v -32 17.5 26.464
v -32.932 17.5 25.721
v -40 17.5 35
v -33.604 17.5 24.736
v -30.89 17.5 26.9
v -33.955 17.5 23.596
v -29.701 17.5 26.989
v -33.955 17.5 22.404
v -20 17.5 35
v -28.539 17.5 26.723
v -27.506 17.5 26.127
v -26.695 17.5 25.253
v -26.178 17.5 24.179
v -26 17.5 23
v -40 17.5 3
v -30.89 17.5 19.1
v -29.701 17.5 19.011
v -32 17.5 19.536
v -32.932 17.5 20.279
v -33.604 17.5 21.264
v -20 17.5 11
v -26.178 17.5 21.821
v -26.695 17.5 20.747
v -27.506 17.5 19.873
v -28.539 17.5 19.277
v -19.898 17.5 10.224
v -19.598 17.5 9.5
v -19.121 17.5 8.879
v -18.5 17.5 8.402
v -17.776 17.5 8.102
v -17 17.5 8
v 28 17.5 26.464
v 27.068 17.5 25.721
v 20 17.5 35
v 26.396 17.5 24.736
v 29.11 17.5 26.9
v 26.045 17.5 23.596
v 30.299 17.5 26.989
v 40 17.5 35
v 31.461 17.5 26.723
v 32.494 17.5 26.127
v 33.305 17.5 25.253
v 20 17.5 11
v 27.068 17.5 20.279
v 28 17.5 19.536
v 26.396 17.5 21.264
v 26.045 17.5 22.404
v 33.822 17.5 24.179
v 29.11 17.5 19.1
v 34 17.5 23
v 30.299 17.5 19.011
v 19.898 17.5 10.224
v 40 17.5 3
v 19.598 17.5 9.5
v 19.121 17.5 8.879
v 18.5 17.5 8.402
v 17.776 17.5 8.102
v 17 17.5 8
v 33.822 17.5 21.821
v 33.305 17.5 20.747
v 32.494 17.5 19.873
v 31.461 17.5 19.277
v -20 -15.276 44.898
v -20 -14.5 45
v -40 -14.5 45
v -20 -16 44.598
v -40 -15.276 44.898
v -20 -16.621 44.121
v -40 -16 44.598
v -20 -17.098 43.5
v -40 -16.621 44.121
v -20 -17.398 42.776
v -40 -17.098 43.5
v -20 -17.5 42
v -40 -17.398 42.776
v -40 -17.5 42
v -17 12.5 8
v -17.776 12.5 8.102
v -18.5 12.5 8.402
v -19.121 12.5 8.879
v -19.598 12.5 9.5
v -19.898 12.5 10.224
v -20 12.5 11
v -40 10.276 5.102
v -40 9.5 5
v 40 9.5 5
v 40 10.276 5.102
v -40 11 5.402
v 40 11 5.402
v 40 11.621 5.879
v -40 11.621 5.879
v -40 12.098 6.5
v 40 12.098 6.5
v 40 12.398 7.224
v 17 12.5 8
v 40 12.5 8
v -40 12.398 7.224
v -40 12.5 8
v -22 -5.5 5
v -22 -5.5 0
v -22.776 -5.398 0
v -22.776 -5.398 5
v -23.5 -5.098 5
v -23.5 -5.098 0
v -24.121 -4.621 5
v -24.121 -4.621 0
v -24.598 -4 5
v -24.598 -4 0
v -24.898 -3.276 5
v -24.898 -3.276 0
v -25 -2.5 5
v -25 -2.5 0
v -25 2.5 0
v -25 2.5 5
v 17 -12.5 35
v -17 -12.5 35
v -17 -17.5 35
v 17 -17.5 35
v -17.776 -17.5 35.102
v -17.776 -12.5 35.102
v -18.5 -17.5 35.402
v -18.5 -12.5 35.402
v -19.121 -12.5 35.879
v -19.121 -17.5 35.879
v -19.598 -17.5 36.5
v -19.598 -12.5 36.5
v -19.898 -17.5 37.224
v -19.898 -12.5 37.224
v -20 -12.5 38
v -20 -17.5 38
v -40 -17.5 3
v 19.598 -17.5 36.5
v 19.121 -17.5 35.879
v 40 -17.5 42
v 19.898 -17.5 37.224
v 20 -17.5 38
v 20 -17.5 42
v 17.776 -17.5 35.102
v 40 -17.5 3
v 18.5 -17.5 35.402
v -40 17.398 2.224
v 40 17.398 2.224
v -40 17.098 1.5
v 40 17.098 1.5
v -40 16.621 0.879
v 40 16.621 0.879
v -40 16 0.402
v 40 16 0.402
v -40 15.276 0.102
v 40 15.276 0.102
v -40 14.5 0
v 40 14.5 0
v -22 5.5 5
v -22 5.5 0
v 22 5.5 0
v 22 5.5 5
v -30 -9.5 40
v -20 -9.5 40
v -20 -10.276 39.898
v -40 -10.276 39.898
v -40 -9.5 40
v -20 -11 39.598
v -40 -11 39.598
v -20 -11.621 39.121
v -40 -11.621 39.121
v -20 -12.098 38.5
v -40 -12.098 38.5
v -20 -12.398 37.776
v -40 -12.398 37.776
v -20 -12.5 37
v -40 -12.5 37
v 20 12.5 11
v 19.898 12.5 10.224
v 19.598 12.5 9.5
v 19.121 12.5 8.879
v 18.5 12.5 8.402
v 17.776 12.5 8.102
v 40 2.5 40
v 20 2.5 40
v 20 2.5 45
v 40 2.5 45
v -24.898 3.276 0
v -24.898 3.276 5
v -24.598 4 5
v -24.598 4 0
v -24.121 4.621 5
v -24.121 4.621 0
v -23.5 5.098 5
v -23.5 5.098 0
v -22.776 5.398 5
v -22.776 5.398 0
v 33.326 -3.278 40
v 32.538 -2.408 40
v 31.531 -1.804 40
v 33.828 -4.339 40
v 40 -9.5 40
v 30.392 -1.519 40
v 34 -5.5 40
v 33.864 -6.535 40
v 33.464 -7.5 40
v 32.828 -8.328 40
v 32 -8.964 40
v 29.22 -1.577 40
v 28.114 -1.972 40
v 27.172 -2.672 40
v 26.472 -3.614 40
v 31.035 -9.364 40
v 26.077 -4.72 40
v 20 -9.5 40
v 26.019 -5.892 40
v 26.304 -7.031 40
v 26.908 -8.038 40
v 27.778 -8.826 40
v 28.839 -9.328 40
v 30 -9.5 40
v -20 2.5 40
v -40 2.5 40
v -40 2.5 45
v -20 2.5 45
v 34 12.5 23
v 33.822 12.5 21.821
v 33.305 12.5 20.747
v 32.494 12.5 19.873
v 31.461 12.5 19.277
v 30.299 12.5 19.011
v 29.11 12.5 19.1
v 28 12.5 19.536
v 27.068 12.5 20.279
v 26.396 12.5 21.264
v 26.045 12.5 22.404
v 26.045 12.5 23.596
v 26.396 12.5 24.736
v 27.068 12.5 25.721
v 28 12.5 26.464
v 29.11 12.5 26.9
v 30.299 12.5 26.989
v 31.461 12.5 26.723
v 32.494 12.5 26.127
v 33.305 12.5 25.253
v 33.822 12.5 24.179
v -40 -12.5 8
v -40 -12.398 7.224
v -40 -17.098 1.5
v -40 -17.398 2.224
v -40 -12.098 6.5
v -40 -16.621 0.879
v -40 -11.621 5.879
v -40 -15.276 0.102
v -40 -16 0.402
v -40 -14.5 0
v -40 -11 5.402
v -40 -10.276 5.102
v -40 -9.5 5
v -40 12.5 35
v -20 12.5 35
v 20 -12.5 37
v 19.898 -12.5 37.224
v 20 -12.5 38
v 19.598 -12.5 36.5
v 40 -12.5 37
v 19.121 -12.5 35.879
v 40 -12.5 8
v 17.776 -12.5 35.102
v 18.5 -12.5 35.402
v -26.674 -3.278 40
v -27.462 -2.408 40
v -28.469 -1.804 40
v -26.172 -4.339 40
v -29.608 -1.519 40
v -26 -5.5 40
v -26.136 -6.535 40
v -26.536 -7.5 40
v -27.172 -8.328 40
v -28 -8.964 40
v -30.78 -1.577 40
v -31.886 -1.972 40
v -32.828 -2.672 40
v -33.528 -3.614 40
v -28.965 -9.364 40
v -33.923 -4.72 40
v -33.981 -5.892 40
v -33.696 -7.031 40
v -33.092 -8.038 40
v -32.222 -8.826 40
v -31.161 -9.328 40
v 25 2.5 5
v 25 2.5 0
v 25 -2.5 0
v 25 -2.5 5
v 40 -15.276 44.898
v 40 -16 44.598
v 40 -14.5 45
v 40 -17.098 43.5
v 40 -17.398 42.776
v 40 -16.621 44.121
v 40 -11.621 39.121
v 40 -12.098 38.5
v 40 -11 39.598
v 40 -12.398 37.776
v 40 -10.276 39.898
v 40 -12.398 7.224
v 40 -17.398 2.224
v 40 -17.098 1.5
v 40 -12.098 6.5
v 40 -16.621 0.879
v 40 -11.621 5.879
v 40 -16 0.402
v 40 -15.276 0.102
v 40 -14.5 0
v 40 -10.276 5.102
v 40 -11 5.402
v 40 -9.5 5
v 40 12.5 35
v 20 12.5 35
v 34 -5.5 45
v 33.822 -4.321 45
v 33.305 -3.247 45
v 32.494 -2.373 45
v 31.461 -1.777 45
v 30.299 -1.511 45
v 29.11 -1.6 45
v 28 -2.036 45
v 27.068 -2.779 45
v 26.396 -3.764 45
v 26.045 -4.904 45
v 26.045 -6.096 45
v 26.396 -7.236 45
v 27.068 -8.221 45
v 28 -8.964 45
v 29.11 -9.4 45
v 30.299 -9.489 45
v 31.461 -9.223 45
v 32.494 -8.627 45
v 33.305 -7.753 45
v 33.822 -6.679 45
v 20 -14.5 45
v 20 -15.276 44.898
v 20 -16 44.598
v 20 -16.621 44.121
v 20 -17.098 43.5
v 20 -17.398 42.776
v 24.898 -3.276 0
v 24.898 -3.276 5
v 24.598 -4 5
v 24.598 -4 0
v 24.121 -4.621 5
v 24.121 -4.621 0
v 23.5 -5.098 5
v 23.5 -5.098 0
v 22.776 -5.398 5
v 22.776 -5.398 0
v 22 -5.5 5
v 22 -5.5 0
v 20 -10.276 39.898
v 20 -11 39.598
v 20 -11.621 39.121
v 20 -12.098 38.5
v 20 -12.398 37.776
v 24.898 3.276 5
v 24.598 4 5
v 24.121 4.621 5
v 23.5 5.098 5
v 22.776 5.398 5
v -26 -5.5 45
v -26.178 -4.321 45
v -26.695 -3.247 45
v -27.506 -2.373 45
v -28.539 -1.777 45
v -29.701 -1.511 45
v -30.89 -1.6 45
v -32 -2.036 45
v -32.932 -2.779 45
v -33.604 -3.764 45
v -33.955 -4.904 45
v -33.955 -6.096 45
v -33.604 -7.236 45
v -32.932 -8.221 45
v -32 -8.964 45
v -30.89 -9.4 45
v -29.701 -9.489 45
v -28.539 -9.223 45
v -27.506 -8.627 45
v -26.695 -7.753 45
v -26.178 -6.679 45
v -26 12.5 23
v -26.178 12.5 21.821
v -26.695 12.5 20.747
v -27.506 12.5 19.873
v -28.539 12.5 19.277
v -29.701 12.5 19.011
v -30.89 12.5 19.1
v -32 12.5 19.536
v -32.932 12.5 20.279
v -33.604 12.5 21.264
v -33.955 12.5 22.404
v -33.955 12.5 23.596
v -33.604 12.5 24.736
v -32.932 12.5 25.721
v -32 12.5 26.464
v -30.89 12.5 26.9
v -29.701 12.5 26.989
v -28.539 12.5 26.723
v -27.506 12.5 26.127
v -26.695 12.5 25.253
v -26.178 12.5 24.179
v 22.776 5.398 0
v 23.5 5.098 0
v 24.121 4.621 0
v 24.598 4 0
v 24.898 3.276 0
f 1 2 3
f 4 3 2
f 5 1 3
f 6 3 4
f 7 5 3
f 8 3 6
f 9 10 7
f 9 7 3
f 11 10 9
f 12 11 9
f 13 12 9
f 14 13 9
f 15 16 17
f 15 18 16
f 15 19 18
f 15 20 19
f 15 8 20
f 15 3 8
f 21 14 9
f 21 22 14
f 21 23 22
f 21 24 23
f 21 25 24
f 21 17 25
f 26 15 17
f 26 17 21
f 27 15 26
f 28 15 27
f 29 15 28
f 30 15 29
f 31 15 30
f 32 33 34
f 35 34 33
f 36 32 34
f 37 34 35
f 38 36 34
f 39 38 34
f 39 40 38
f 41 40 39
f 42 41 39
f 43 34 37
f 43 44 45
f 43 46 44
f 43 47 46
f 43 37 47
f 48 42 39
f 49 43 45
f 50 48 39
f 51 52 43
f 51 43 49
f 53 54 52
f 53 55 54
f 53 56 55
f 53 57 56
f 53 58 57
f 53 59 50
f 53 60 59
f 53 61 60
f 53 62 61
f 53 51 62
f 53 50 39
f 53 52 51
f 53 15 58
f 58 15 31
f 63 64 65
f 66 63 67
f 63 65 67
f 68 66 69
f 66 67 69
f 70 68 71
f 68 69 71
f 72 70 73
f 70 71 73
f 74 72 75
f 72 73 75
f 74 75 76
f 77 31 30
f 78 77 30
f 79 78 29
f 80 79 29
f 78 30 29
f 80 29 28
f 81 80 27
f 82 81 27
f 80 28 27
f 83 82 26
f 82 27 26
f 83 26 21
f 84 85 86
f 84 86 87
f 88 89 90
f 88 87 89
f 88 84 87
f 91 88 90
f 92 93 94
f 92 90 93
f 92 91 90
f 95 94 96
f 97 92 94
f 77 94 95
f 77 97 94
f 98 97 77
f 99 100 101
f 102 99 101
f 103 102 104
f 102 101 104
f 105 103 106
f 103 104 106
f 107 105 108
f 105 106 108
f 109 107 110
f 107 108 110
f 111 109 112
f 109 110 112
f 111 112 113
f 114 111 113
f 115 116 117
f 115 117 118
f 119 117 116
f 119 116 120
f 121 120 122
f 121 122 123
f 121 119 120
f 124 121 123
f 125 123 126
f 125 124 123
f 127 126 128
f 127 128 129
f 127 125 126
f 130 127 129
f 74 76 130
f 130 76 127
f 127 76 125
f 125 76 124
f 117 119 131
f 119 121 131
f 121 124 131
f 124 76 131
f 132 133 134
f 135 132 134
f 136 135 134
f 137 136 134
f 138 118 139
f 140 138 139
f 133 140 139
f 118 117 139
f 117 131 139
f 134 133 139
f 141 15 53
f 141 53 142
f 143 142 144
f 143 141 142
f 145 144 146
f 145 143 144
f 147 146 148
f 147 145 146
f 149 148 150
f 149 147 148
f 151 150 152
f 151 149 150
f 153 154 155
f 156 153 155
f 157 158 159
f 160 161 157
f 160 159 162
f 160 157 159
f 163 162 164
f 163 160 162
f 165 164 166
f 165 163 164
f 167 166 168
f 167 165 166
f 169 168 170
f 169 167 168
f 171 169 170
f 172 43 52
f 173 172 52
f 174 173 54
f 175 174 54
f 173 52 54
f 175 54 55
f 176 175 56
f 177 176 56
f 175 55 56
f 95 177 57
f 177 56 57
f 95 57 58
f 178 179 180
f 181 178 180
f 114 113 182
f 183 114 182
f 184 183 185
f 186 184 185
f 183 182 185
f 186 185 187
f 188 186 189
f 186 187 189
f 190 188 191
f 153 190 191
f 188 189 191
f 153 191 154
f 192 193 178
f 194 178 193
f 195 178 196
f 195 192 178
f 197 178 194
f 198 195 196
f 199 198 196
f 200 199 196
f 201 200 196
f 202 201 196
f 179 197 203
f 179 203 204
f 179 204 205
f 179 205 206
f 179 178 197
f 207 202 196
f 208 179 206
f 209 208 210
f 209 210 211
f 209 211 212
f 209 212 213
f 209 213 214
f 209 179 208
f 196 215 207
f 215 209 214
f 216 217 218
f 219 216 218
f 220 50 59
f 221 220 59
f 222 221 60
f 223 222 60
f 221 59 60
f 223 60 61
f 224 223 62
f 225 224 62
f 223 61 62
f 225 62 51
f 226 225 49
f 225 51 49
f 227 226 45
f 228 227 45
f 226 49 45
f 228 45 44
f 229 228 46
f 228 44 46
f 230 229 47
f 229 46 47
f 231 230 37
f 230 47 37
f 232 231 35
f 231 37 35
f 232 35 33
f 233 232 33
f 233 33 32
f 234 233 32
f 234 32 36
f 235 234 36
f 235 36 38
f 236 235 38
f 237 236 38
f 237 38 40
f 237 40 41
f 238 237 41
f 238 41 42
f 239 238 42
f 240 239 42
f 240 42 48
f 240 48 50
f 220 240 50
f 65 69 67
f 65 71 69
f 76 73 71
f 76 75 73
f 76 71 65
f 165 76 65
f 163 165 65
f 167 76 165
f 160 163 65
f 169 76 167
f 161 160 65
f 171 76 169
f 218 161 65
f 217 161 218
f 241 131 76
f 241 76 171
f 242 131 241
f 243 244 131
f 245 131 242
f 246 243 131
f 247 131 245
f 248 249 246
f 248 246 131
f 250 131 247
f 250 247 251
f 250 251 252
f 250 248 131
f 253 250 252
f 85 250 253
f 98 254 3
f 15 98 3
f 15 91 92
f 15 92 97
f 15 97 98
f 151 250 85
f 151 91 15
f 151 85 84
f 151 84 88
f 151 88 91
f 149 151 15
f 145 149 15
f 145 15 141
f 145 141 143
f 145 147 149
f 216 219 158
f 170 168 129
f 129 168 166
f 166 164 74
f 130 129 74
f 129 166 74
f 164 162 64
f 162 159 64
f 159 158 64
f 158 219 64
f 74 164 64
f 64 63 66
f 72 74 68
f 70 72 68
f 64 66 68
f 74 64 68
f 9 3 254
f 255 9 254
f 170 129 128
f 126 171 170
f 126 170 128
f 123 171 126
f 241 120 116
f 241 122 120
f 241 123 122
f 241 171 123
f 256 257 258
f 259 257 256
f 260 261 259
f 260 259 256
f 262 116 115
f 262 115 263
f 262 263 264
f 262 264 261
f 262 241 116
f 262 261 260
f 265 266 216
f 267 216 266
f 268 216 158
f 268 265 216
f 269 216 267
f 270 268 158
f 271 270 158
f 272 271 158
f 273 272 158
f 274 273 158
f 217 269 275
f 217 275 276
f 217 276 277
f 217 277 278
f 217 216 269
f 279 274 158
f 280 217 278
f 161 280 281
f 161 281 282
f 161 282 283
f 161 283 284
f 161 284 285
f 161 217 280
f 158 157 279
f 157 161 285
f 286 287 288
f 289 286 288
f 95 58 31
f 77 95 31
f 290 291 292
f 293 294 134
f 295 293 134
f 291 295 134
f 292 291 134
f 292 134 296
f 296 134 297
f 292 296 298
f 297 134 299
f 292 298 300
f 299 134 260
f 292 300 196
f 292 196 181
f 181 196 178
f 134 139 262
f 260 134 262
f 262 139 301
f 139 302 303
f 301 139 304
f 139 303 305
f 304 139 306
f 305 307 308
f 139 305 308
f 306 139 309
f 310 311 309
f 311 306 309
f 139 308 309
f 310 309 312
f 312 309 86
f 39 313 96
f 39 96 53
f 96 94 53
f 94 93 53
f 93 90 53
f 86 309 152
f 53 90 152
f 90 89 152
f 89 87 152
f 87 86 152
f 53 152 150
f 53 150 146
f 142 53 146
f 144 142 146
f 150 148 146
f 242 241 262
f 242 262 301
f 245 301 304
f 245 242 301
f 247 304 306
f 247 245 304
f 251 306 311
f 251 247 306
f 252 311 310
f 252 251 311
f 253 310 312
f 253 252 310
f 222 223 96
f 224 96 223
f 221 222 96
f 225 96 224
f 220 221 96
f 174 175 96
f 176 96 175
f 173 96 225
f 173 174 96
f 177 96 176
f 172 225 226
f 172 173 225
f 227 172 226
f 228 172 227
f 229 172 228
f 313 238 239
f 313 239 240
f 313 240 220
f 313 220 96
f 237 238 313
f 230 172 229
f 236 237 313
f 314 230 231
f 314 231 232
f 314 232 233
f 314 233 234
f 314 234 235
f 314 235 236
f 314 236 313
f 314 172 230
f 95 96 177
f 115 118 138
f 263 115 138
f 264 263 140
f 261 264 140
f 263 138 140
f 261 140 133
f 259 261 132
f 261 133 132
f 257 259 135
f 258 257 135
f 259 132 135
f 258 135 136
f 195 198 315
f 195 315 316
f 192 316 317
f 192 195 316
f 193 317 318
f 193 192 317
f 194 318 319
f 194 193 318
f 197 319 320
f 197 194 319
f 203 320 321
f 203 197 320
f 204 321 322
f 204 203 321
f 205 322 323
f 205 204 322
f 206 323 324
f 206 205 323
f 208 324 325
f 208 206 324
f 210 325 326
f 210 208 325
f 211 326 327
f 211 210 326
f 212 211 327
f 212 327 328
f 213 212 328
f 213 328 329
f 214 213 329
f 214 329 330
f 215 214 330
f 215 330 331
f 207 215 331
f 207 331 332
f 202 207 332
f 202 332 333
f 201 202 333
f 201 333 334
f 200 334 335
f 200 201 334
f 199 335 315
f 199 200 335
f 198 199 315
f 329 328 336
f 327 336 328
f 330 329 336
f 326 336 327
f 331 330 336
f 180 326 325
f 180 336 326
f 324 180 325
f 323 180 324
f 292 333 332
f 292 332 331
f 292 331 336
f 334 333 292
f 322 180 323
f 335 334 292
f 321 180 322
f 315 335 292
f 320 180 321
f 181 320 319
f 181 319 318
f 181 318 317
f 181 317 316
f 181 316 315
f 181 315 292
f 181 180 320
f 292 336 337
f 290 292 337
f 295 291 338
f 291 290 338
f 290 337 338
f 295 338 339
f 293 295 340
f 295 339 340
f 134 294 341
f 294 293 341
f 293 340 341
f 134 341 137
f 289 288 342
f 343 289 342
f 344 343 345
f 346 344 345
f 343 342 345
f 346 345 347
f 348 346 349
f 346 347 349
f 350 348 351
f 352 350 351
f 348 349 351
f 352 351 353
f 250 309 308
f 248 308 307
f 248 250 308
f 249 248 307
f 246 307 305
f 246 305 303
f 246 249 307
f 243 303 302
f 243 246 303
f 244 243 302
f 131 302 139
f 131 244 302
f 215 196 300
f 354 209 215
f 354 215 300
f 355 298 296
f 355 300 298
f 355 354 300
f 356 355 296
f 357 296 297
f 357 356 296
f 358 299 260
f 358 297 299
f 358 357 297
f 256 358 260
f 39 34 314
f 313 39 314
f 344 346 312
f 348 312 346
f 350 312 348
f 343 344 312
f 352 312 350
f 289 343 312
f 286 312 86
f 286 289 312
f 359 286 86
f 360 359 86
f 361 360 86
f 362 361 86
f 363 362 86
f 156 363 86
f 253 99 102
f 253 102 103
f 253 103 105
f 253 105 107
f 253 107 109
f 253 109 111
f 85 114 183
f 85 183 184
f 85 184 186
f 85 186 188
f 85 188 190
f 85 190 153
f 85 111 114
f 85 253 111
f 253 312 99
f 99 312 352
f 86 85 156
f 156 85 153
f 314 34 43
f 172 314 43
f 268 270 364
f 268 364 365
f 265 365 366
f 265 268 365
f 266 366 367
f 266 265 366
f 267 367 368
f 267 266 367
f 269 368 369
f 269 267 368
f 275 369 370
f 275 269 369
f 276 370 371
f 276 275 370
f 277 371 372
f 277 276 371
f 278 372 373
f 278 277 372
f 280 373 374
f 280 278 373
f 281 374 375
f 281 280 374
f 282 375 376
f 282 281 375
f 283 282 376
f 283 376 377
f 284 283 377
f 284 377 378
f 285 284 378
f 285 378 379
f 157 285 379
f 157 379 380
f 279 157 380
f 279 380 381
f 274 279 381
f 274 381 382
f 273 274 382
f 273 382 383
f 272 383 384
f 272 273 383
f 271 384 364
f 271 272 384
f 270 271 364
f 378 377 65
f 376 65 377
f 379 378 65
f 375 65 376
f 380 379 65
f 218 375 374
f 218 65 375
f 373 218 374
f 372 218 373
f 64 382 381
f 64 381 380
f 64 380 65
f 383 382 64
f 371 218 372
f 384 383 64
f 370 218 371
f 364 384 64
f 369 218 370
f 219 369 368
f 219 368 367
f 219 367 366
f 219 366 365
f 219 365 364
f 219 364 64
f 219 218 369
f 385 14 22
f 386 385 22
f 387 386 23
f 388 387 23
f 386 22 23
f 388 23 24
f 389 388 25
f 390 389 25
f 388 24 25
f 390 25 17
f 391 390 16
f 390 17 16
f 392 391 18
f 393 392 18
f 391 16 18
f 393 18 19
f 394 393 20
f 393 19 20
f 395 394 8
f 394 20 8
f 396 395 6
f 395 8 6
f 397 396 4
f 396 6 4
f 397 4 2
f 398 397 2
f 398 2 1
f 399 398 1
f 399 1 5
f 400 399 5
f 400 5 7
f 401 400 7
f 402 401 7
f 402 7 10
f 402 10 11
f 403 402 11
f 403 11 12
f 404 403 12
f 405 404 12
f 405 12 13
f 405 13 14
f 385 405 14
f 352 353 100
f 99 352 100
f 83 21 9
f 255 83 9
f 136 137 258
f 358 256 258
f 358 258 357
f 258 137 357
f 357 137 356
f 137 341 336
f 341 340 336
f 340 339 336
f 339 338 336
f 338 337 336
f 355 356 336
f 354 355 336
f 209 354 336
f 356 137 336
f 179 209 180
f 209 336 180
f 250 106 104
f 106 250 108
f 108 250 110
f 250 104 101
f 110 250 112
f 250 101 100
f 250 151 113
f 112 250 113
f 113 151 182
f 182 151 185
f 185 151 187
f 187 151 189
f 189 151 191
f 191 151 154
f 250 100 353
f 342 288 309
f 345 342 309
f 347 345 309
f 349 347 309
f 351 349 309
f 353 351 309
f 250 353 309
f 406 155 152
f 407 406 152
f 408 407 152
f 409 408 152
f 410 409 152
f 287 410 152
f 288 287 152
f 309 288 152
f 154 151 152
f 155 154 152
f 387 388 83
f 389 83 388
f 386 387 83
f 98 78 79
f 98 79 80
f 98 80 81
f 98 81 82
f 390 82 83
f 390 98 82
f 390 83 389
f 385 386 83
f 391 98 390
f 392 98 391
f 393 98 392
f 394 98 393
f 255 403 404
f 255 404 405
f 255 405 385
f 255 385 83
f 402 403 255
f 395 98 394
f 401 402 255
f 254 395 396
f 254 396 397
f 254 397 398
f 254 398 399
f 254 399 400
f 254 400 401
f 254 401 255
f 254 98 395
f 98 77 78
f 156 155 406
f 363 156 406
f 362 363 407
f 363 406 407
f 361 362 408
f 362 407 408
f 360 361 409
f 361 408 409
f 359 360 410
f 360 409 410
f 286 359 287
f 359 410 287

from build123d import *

# Parameters (mm, degrees)
SKETCH1_W                     = 80
SKETCH1_H                     = 35
RECTANGLE_BLOCK_EXTRUDE_DEPTH = 45
HOLLOW_OUT_BLOCK_CUT_DEPTH    = 81
OPEN_CORNER_CUT_DEPTH         = 81
TOP_CUTS_REACH                = 37
SKETCH15_R                    = 4
CIRCLE_CUT_ON_FRONT_REACH     = 12
SKETCH18_R                    = 4
RECTANGLE_CUT_ON_BACK_DEPTH   = 5
CUT_EXTRUDE17_DEPTH           = 81
SKETCH25_W                    = 40
SKETCH25_H                    = 3
SKETCH25_H_2                  = 17
CUT_EXTRUDE18_DEPTH           = 10
BOSS_EXTRUDE6_DEPTH           = 5


with BuildPart() as part:
    # Sketch1 → Rectangle Block Extrude (new body)
    with BuildSketch(Plane.XY):
        Rectangle(SKETCH1_W, SKETCH1_H)
    extrude(amount=RECTANGLE_BLOCK_EXTRUDE_DEPTH)

    # Sketch11 → Hollow Out Block Cut (cut, through all)
    with BuildSketch(Plane.ZY.offset(40)):
        with BuildLine():
            Line((8, 12.5), (37, 12.5))
            ThreePointArc((37, 12.5), (39.121320344, 11.621320344), (40, 9.5))
            Line((40, 9.5), (40, -9.5))
            ThreePointArc((40, -9.5), (39.121320344, -11.621320344), (37, -12.5))
            Line((37, -12.5), (8, -12.5))
            ThreePointArc((8, -12.5), (5.878679656, -11.621320344), (5, -9.5))
            Line((5, -9.5), (5, 9.5))
            ThreePointArc((5, 9.5), (5.878679656, 11.621320344), (8, 12.5))
        make_face()
    extrude(amount=-HOLLOW_OUT_BLOCK_CUT_DEPTH, mode=Mode.SUBTRACT)

    # Sketch12 → Open Corner Cut (cut, through all)
    with BuildSketch(Plane.ZY.offset(40)):
        with BuildLine():
            Line((35, 17.5), (35, 12.5))
            Line((35, 12.5), (37, 12.5))
            ThreePointArc((37, 12.5), (39.121320344, 11.621320344), (40, 9.5))
            Line((40, 9.5), (40, 2.5))
            Line((40, 2.5), (45, 2.5))
            Line((45, 2.5), (45, 17.5))
            Line((45, 17.5), (35, 17.5))
        make_face()
    extrude(amount=-OPEN_CORNER_CUT_DEPTH, mode=Mode.SUBTRACT)

    # Sketch15 → Top Cuts (cut, up to next)
    with BuildSketch(Plane(origin=(0, 17.5, 0), x_dir=(1, 0, 0), z_dir=(0, 1, 0)), mode=Mode.PRIVATE) as top_cuts_sk1:
        with BuildLine():
            Line((17, -8), (-17, -8))
            ThreePointArc((-17, -8), (-19.121320344, -8.878679656), (-20, -11))
            Line((-20, -11), (-20, -35))
            Line((-20, -35), (20, -35))
            Line((20, -35), (20, -11))
            ThreePointArc((20, -11), (19.121320344, -8.878679656), (17, -8))
        make_face()
    top_cuts_tool1 = extrude(top_cuts_sk1.sketch, amount=-TOP_CUTS_REACH, mode=Mode.PRIVATE) & part.part
    add(top_cuts_tool1.solids().sort_by_distance((0, 17.5, 21.546053))[0], mode=Mode.SUBTRACT)
    # Sketch15 → Top Cuts (cut, up to next)
    with BuildSketch(Plane(origin=(0, 17.5, 0), x_dir=(1, 0, 0), z_dir=(0, 1, 0)), mode=Mode.PRIVATE) as top_cuts_sk2:
        with Locations((-30, -23)):
            Circle(SKETCH15_R)
    top_cuts_tool2 = extrude(top_cuts_sk2.sketch, amount=-TOP_CUTS_REACH, mode=Mode.PRIVATE) & part.part
    add(top_cuts_tool2.solids().sort_by_distance((-30, 17.5, 23))[0], mode=Mode.SUBTRACT)
    # Sketch15 → Top Cuts (cut, up to next)
    with BuildSketch(Plane(origin=(0, 17.5, 0), x_dir=(1, 0, 0), z_dir=(0, 1, 0)), mode=Mode.PRIVATE) as top_cuts_sk3:
        with Locations((30, -23)):
            Circle(SKETCH15_R)
    top_cuts_tool3 = extrude(top_cuts_sk3.sketch, amount=-TOP_CUTS_REACH, mode=Mode.PRIVATE) & part.part
    add(top_cuts_tool3.solids().sort_by_distance((30, 17.5, 23))[0], mode=Mode.SUBTRACT)

    # Sketch18 → Circle Cut on Front (cut, up to next)
    with BuildSketch(Plane.XY.offset(35), mode=Mode.PRIVATE) as circle_cut_on_front_sk1:
        with Locations((-30, -5.5)):
            Circle(SKETCH18_R)
    circle_cut_on_front_tool1 = extrude(circle_cut_on_front_sk1.sketch, amount=CIRCLE_CUT_ON_FRONT_REACH, mode=Mode.PRIVATE) & part.part
    add(circle_cut_on_front_tool1.solids().sort_by_distance((-30, -5.5, 35))[0], mode=Mode.SUBTRACT)
    # Sketch18 → Circle Cut on Front (cut, up to next)
    with BuildSketch(Plane.XY.offset(35), mode=Mode.PRIVATE) as circle_cut_on_front_sk2:
        with Locations((30, -5.5)):
            Circle(SKETCH18_R)
    circle_cut_on_front_tool2 = extrude(circle_cut_on_front_sk2.sketch, amount=CIRCLE_CUT_ON_FRONT_REACH, mode=Mode.PRIVATE) & part.part
    add(circle_cut_on_front_tool2.solids().sort_by_distance((30, -5.5, 35))[0], mode=Mode.SUBTRACT)

    # Sketch23 → Rectangle Cut on Back (cut)
    with BuildSketch(Plane(origin=(0, 0, 0), x_dir=(-1, 0, 0), z_dir=(0, 0, -1))):
        with BuildLine():
            Line((22, 5.5), (-22, 5.5))
            ThreePointArc((-22, 5.5), (-24.121320344, 4.621320344), (-25, 2.5))
            Line((-25, 2.5), (-25, -2.5))
            ThreePointArc((-25, -2.5), (-24.121320344, -4.621320344), (-22, -5.5))
            Line((-22, -5.5), (22, -5.5))
            ThreePointArc((22, -5.5), (24.121320344, -4.621320344), (25, -2.5))
            Line((25, -2.5), (25, 2.5))
            ThreePointArc((25, 2.5), (24.121320344, 4.621320344), (22, 5.5))
        make_face()
    extrude(amount=-RECTANGLE_CUT_ON_BACK_DEPTH, mode=Mode.SUBTRACT)

    # Sketch24 → Cut-Extrude17 (cut, through all)
    with BuildSketch(Plane.ZY.offset(40)):
        with BuildLine():
            Line((3, -17.5), (0, -17.5))
            Line((0, -17.5), (0, -14.5))
            ThreePointArc((0, -14.5), (0.878679656, -16.621320344), (3, -17.5))
        make_face()
        with BuildLine():
            Line((0, 14.5), (0, 17.5))
            Line((0, 17.5), (3, 17.5))
            ThreePointArc((3, 17.5), (0.878679656, 16.621320344), (0, 14.5))
        make_face()
        with BuildLine():
            Line((42, -17.5), (45, -17.5))
            Line((45, -17.5), (45, -14.5))
            ThreePointArc((45, -14.5), (44.121320344, -16.621320344), (42, -17.5))
        make_face()
    extrude(amount=-CUT_EXTRUDE17_DEPTH, mode=Mode.SUBTRACT)

    # Sketch25 → Cut-Extrude18 (cut)
    with BuildSketch(Plane.XY.offset(45)):
        with Locations((0, -16)):
            Rectangle(SKETCH25_W, SKETCH25_H)
        with Locations((0, -6)):
            Rectangle(SKETCH25_W, SKETCH25_H_2)
    extrude(amount=-CUT_EXTRUDE18_DEPTH, mode=Mode.SUBTRACT)

    # Sketch28 → Boss-Extrude6 (add)
    with BuildSketch(Plane(origin=(0, -17.5, 0), x_dir=(-1, 0, 0), z_dir=(0, -1, 0))):
        with BuildLine():
            Line((-20, -38), (-20, -35))
            Line((-20, -35), (-17, -35))
            ThreePointArc((-17, -35), (-19.121320344, -35.878679656), (-20, -38))
        make_face()
        with BuildLine():
            Line((20, -38), (20, -35))
            Line((20, -35), (17, -35))
            ThreePointArc((17, -35), (19.121320344, -35.878679656), (20, -38))
        make_face()
    extrude(amount=-BOSS_EXTRUDE6_DEPTH)


solid = part.part
